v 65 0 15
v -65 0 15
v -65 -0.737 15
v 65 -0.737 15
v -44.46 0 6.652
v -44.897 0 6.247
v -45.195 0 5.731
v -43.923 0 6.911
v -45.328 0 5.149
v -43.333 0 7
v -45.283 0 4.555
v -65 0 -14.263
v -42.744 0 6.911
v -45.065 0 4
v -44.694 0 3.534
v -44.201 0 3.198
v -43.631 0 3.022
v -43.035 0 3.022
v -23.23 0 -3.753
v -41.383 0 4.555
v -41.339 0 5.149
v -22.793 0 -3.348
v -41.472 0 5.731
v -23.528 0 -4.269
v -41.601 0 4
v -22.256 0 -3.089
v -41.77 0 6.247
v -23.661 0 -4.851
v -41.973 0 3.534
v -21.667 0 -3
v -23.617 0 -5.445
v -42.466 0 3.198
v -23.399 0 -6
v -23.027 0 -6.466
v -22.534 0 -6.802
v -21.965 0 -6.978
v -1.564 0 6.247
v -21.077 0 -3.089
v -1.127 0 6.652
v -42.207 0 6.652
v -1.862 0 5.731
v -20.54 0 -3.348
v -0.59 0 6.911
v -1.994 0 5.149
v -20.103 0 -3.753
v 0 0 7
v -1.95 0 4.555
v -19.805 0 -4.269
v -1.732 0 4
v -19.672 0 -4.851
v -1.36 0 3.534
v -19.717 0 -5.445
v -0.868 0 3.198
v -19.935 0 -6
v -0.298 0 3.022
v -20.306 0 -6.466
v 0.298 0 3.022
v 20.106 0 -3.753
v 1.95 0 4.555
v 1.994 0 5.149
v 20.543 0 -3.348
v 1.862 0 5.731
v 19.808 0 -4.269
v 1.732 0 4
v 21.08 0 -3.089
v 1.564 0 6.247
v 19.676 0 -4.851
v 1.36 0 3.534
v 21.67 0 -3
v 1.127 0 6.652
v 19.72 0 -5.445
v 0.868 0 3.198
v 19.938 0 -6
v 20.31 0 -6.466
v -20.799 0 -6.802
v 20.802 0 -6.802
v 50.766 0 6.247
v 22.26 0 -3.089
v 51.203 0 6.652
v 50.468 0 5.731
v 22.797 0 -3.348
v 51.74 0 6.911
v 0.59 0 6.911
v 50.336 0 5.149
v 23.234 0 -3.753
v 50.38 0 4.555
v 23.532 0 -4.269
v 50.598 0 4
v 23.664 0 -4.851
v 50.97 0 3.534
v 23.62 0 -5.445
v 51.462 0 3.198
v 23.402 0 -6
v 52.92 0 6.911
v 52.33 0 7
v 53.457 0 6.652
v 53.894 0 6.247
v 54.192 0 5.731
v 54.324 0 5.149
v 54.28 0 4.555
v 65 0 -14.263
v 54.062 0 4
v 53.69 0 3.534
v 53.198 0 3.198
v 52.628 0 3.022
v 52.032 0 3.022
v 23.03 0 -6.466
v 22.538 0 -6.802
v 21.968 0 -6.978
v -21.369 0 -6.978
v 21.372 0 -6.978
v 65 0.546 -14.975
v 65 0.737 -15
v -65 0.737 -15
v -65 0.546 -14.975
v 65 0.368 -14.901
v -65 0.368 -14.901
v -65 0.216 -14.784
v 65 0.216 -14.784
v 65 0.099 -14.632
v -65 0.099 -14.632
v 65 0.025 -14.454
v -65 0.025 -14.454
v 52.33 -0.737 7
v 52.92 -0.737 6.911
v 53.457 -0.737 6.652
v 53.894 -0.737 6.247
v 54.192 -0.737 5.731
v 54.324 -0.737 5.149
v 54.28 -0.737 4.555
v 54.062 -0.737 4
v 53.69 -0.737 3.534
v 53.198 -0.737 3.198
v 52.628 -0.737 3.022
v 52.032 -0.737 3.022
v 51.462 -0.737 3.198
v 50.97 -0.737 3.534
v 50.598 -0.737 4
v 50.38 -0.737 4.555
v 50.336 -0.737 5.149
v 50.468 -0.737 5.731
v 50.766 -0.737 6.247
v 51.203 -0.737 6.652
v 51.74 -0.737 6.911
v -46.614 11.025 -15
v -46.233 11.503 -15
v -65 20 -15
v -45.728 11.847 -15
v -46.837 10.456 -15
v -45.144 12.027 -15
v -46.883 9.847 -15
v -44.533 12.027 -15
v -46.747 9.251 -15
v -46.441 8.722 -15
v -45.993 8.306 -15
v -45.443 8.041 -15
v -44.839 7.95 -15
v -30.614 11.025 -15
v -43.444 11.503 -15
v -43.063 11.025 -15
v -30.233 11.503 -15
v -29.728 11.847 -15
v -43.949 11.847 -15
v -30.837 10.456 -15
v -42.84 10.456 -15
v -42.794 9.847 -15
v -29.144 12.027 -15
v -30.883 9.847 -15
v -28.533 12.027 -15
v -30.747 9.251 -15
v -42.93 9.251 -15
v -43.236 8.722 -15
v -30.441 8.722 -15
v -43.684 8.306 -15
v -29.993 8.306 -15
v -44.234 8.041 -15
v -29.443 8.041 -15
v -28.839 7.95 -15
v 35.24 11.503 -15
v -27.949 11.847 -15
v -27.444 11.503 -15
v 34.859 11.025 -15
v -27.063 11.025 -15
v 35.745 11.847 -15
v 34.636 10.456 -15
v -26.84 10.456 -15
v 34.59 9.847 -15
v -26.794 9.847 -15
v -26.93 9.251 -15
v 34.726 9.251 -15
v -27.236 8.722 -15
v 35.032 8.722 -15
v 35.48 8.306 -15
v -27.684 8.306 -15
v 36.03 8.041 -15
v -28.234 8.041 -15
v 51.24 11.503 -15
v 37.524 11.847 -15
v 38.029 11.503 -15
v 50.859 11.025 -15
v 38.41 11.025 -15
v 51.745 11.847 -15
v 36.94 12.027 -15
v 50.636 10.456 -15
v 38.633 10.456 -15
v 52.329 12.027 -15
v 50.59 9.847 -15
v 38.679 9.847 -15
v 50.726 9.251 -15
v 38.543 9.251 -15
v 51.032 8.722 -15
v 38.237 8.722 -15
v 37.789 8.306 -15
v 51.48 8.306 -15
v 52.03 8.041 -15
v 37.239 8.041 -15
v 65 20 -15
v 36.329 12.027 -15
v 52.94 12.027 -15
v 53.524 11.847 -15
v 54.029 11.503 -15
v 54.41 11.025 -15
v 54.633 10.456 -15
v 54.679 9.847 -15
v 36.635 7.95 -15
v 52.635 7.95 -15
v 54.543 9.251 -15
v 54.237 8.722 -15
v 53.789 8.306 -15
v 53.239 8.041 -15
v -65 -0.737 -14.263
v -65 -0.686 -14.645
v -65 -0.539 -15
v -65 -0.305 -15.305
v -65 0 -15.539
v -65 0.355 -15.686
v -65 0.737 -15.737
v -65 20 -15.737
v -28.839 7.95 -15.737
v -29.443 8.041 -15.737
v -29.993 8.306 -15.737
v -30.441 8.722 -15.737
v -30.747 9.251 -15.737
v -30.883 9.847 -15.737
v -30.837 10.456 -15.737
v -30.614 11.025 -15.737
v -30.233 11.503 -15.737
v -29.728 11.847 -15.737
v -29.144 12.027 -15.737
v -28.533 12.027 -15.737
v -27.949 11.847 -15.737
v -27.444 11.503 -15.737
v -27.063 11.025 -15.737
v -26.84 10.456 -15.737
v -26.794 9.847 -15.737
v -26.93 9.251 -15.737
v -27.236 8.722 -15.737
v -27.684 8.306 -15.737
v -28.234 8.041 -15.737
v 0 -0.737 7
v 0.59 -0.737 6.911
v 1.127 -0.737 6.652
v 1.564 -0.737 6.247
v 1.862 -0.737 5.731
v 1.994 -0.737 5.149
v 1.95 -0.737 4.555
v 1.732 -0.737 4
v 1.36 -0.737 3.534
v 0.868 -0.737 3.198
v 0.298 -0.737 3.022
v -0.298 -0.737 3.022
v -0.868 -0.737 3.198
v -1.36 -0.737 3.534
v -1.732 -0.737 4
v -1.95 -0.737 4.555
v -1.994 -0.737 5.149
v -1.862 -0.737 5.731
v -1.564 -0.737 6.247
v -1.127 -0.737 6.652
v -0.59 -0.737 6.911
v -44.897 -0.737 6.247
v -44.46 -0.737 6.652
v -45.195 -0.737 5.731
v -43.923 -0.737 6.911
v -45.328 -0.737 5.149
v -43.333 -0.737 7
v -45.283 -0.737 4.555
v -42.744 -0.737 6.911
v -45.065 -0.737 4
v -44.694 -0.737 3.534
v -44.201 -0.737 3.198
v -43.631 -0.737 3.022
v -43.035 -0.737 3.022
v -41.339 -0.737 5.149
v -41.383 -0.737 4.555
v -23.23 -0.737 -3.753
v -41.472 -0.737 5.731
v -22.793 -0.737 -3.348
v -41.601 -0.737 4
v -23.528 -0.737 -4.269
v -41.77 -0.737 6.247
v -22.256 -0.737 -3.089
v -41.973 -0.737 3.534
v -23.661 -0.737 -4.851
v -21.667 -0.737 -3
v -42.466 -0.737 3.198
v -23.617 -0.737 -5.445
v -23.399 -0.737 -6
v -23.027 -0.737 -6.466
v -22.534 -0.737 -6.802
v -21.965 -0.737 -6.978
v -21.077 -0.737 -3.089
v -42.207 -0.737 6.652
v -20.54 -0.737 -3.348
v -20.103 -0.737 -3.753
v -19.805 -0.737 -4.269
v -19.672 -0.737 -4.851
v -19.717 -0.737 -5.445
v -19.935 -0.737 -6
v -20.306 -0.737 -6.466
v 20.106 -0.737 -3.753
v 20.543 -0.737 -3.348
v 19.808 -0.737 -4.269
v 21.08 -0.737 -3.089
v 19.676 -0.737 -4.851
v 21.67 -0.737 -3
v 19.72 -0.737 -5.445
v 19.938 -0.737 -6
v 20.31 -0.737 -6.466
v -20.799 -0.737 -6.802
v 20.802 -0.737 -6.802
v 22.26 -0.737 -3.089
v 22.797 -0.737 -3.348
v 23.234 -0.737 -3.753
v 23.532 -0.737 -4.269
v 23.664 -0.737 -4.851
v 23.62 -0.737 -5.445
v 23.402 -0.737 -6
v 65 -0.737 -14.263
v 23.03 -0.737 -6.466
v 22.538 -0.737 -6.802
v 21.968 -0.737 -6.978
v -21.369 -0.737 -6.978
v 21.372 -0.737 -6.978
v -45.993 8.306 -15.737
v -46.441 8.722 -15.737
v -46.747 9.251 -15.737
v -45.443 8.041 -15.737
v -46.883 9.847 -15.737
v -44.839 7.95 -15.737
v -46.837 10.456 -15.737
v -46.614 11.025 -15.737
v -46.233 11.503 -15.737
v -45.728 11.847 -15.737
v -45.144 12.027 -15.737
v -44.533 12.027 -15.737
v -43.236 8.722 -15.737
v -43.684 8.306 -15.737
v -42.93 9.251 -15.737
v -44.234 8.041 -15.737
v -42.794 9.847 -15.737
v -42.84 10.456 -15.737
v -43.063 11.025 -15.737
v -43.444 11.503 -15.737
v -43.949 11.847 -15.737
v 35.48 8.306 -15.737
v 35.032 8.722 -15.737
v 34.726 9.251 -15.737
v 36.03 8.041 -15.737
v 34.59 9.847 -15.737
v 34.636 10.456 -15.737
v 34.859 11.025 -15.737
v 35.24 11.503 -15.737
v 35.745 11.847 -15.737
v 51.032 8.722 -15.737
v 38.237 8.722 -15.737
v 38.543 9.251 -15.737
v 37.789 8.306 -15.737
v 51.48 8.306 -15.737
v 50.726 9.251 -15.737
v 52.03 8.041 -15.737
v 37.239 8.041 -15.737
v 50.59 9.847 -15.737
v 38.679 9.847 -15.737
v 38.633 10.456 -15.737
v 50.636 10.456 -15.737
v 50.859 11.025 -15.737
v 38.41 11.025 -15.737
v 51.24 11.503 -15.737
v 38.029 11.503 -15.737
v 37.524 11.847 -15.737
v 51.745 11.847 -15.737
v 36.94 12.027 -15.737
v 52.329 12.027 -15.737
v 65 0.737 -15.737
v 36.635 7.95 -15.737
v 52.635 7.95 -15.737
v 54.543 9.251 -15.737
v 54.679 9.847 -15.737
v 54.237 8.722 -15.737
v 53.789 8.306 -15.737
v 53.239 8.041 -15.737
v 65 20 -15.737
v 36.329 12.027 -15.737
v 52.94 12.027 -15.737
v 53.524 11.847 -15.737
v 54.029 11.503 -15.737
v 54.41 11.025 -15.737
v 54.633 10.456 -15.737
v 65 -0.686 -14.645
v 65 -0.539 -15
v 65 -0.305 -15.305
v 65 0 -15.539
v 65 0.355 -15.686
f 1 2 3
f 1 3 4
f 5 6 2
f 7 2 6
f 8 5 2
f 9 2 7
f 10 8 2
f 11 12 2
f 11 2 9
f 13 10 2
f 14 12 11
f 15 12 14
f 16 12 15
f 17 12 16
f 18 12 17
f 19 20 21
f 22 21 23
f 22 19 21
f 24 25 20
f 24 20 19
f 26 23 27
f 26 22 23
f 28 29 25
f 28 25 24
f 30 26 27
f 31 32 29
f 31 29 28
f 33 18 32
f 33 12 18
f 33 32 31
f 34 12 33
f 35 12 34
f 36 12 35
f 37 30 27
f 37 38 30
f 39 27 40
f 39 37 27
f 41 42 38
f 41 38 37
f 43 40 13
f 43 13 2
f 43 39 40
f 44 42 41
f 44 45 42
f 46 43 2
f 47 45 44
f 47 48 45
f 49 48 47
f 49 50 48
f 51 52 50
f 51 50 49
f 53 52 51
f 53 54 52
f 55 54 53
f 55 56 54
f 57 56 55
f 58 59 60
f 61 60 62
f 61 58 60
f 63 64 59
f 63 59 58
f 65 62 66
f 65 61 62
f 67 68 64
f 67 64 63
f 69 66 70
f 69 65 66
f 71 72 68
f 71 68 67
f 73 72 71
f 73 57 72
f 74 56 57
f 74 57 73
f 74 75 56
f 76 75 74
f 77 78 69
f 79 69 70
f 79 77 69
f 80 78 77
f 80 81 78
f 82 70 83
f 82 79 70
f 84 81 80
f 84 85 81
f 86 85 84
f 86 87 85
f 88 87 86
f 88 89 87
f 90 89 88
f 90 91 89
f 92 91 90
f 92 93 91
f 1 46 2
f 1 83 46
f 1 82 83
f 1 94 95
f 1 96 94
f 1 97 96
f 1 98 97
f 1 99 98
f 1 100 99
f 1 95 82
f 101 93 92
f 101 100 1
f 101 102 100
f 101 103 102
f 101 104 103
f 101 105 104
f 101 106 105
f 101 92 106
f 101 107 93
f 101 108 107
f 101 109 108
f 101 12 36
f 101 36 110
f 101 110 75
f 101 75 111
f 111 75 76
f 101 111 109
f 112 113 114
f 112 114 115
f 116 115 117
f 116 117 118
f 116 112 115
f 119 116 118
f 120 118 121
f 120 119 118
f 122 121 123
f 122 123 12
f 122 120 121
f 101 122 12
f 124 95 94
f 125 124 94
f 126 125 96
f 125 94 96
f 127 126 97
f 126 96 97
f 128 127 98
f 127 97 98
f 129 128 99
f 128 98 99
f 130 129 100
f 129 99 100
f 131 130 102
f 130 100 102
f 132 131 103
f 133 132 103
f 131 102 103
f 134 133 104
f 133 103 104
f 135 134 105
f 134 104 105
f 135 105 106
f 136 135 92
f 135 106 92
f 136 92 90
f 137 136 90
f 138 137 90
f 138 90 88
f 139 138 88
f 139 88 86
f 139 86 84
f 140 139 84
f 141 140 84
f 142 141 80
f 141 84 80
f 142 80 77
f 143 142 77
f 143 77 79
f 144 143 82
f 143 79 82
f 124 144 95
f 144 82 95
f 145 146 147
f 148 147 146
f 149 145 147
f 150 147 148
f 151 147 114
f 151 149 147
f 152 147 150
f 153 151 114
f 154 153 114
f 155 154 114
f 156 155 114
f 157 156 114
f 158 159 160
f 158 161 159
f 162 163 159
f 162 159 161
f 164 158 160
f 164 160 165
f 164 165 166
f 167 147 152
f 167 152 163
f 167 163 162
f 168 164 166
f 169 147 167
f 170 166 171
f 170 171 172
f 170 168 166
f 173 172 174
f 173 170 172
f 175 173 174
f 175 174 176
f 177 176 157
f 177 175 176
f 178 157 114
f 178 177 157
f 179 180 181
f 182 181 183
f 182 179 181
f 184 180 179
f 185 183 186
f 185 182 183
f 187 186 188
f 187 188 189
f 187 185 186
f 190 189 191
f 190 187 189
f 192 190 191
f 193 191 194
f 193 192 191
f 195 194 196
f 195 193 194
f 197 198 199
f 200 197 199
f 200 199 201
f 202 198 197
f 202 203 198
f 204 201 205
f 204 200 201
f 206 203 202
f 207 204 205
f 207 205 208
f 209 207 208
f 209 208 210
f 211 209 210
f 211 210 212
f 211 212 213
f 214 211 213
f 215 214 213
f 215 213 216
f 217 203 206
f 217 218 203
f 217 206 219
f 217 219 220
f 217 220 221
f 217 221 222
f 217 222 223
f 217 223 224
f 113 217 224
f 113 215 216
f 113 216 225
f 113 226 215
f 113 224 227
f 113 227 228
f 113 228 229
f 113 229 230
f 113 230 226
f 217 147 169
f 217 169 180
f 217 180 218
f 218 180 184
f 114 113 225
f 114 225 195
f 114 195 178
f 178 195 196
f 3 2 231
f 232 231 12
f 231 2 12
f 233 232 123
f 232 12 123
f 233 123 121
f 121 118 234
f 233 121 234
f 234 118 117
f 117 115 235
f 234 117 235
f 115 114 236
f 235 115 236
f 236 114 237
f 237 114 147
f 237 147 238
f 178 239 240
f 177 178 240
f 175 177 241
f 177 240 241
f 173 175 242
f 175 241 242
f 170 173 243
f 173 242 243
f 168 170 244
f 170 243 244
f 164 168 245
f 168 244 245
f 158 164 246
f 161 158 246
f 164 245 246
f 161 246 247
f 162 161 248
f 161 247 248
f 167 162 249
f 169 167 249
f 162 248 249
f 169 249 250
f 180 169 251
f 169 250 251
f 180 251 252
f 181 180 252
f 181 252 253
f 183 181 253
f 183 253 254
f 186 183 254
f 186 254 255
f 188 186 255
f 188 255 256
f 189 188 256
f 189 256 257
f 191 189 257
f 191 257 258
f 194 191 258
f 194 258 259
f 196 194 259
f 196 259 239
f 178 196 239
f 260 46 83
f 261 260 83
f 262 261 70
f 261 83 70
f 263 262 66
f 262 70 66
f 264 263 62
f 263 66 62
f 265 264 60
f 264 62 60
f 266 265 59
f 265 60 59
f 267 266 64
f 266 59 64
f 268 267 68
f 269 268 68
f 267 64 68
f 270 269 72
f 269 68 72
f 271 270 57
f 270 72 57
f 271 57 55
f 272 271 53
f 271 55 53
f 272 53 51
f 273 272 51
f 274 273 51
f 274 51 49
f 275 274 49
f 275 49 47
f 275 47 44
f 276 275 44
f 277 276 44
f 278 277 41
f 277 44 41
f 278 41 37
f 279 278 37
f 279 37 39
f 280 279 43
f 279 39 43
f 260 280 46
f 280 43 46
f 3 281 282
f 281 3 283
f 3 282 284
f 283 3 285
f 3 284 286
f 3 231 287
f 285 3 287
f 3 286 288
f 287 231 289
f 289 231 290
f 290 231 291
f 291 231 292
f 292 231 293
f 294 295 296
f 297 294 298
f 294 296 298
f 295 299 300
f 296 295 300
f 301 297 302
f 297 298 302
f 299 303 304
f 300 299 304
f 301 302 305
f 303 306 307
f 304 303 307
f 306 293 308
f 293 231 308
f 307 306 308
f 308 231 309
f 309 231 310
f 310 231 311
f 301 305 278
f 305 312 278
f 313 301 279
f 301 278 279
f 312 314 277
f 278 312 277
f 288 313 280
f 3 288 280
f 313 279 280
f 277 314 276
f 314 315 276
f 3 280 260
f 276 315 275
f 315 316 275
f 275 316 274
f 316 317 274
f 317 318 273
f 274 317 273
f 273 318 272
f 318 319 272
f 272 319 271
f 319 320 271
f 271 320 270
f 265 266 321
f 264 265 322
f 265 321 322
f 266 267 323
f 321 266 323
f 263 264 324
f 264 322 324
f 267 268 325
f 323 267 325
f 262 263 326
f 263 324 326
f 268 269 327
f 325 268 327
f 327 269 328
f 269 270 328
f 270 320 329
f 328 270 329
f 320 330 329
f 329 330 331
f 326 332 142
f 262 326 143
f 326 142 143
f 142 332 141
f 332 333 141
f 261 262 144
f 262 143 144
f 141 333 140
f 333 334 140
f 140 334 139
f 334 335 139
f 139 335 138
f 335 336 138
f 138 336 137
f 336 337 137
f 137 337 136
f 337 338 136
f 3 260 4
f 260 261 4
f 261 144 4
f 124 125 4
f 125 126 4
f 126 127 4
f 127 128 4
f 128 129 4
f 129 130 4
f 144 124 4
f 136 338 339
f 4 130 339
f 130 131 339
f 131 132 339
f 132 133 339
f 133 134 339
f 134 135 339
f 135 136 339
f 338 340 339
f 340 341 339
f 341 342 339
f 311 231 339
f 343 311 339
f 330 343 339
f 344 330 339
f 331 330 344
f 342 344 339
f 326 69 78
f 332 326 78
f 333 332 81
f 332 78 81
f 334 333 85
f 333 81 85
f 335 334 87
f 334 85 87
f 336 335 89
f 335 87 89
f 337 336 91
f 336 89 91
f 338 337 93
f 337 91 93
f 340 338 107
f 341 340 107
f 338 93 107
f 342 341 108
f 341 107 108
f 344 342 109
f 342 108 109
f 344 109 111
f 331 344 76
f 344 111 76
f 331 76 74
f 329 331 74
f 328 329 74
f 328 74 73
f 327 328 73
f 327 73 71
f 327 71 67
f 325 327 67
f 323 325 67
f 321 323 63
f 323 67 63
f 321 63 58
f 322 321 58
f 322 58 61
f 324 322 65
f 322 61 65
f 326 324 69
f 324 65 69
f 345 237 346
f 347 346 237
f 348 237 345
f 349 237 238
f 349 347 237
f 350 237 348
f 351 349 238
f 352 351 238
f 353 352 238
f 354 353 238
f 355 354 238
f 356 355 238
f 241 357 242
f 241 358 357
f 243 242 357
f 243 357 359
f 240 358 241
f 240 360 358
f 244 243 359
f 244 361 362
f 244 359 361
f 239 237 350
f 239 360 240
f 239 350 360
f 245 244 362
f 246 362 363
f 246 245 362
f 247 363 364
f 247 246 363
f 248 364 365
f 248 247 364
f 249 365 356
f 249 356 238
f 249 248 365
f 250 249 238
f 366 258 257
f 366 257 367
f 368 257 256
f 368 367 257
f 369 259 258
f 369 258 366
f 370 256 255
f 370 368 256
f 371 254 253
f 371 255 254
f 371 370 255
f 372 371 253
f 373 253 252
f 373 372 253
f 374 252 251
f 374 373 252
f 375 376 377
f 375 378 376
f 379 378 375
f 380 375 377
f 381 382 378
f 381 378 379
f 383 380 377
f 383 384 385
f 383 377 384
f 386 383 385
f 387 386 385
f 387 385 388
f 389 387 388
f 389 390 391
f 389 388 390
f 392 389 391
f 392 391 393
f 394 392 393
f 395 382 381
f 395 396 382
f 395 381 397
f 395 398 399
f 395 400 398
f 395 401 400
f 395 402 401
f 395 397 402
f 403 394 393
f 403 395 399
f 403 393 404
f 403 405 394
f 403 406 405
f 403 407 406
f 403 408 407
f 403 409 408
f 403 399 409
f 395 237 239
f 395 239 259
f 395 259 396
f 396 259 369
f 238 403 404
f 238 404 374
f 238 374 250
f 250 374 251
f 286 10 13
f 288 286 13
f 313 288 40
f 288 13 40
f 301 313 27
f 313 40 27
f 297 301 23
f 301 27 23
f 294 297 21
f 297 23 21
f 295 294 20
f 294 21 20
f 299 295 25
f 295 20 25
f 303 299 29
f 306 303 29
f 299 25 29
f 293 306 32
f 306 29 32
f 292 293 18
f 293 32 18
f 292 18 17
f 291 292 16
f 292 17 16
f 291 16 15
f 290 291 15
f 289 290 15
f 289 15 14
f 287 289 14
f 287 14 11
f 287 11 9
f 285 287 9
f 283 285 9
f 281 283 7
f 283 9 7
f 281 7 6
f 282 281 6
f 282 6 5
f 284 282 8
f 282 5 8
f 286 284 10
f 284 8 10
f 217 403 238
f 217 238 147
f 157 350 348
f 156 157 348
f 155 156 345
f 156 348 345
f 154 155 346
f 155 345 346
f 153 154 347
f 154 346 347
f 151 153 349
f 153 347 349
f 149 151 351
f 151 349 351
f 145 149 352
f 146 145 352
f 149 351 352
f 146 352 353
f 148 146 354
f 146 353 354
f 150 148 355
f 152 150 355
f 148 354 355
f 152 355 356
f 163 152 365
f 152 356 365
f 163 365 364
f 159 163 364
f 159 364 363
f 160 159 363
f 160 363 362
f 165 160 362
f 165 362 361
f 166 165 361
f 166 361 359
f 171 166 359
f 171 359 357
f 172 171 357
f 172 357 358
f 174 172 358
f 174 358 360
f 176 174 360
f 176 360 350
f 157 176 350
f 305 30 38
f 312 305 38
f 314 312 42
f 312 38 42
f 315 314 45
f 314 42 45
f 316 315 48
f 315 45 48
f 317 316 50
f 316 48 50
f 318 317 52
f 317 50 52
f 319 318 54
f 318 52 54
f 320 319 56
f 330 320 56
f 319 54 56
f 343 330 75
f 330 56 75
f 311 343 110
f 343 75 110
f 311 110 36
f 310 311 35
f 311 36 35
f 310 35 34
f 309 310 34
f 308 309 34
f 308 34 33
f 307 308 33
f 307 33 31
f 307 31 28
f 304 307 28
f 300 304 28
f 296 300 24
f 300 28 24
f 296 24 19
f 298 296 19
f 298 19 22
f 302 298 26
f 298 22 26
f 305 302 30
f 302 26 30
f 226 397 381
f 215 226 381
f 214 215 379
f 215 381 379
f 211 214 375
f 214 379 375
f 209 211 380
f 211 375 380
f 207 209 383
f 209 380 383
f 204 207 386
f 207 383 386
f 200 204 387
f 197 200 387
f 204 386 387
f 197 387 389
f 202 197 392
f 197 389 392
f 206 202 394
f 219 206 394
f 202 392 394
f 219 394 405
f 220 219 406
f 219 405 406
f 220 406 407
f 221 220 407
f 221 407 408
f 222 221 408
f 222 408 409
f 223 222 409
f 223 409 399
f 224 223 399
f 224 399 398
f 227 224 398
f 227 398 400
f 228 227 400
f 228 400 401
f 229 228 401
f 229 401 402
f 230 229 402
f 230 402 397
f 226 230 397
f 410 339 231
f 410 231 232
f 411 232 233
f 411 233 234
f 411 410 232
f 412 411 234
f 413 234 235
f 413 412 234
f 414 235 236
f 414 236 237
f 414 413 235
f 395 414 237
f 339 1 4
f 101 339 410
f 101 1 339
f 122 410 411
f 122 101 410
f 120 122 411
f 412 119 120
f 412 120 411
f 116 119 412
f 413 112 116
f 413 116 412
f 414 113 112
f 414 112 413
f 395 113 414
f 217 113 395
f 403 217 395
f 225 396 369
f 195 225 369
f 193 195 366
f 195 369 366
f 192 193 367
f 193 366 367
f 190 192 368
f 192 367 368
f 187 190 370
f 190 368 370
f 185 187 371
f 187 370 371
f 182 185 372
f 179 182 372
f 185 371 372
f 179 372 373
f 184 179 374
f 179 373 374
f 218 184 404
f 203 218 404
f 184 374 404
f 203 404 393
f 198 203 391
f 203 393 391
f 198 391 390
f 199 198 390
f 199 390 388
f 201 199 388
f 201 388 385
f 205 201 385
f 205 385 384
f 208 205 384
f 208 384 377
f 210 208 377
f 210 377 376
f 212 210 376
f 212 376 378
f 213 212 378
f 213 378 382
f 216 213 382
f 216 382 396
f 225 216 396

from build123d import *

# Parameters (mm, degrees)
SKETCH1_W                    = 130
SKETCH1_H                    = 30
SKETCH1_R                    = 2
BASE_FLANGE1_DEPTH           = 0.7366
EDGE_FLANGE1_STRIP_W         = 4.4196
EDGE_FLANGE1_STRIP_H         = 0.7366
EDGE_FLANGE1_STRIP_CUT_DEPTH = 130
EDGE_FLANGE1_DEPTH           = 130
SKETCH9_R                    = 2.05
CUT_EXTRUDE1_DEPTH           = 245.182063336


# Sheet-metal steps are written as plain solids
with BuildPart() as part:
    # Sketch1 → Base-Flange1 (new body)
    with BuildSketch(Plane(origin=(0, 0, 0), x_dir=(1, 0, 0), z_dir=(0, 1, 0))):
        Rectangle(SKETCH1_W, SKETCH1_H)
        with Locations(Location((0, -5, 0), (0, 0, 270))):
            Circle(SKETCH1_R, mode=Mode.SUBTRACT)
        with Locations(Location((-21.666666667, 5, 0), (0, 0, 270))):
            Circle(SKETCH1_R, mode=Mode.SUBTRACT)
        with Locations(Location((-43.333333333, -5, 0), (0, 0, 270))):
            Circle(SKETCH1_R, mode=Mode.SUBTRACT)
        with Locations(Location((52.33, -5, 0), (0, 0, 270))):
            Circle(SKETCH1_R, mode=Mode.SUBTRACT)
        with Locations(Location((21.67, 5, 0), (0, 0, 270))):
            Circle(SKETCH1_R, mode=Mode.SUBTRACT)
    extrude(amount=-BASE_FLANGE1_DEPTH)

    # Edge-Flange1 strip (across the edge) → Edge-Flange1 strip cut (cut)
    with BuildSketch(Plane(origin=(65, 0, -15), x_dir=(0, 0, 1), z_dir=(-1, 0, 0))):
        with Locations((-1.4732, -0.3683)):
            Rectangle(EDGE_FLANGE1_STRIP_W, EDGE_FLANGE1_STRIP_H)
    extrude(amount=EDGE_FLANGE1_STRIP_CUT_DEPTH, mode=Mode.SUBTRACT)

    # Edge-Flange1 section (across the edge) → Edge-Flange1 (add)
    with BuildSketch(Plane(origin=(65, 0, -15), x_dir=(0, 0, 1), z_dir=(-1, 0, 0))):
        with BuildLine():
            Line((-0.7366, 0.7366), (-0.7366, 20))
            Line((-0.7366, 20), (0, 20))
            Line((0, 20), (0, 0.7366))
            ThreePointArc((0, 0.7366), (0.215745145, 0.215745145), (0.7366, 0))
            Line((0.7366, 0), (0.7366, -0.7366))
            ThreePointArc((0.7366, -0.7366), (-0.30510971, -0.30510971), (-0.7366, 0.7366))
        make_face()
    extrude(amount=EDGE_FLANGE1_DEPTH)

    # Sketch9 → Cut-Extrude1 (cut, through all)
    with BuildSketch(Plane(origin=(-5.975935003, -11.740421973, -216.4732), x_dir=(-1, 0, 0), z_dir=(0, 0, -1))):
        with Locations(Location((-42.610472437, 21.740421973, 0), (0, 0, 270))):
            Circle(SKETCH9_R)
        with Locations(Location((-58.610472437, 21.740421973, 0), (0, 0, 270))):
            Circle(SKETCH9_R)
        with Locations(Location((22.862727563, 21.740421973, 0), (0, 0, 270))):
            Circle(SKETCH9_R)
        with Locations(Location((38.862727563, 21.740421973, 0), (0, 0, 270))):
            Circle(SKETCH9_R)
    extrude(amount=-CUT_EXTRUDE1_DEPTH, mode=Mode.SUBTRACT)


solid = part.part
